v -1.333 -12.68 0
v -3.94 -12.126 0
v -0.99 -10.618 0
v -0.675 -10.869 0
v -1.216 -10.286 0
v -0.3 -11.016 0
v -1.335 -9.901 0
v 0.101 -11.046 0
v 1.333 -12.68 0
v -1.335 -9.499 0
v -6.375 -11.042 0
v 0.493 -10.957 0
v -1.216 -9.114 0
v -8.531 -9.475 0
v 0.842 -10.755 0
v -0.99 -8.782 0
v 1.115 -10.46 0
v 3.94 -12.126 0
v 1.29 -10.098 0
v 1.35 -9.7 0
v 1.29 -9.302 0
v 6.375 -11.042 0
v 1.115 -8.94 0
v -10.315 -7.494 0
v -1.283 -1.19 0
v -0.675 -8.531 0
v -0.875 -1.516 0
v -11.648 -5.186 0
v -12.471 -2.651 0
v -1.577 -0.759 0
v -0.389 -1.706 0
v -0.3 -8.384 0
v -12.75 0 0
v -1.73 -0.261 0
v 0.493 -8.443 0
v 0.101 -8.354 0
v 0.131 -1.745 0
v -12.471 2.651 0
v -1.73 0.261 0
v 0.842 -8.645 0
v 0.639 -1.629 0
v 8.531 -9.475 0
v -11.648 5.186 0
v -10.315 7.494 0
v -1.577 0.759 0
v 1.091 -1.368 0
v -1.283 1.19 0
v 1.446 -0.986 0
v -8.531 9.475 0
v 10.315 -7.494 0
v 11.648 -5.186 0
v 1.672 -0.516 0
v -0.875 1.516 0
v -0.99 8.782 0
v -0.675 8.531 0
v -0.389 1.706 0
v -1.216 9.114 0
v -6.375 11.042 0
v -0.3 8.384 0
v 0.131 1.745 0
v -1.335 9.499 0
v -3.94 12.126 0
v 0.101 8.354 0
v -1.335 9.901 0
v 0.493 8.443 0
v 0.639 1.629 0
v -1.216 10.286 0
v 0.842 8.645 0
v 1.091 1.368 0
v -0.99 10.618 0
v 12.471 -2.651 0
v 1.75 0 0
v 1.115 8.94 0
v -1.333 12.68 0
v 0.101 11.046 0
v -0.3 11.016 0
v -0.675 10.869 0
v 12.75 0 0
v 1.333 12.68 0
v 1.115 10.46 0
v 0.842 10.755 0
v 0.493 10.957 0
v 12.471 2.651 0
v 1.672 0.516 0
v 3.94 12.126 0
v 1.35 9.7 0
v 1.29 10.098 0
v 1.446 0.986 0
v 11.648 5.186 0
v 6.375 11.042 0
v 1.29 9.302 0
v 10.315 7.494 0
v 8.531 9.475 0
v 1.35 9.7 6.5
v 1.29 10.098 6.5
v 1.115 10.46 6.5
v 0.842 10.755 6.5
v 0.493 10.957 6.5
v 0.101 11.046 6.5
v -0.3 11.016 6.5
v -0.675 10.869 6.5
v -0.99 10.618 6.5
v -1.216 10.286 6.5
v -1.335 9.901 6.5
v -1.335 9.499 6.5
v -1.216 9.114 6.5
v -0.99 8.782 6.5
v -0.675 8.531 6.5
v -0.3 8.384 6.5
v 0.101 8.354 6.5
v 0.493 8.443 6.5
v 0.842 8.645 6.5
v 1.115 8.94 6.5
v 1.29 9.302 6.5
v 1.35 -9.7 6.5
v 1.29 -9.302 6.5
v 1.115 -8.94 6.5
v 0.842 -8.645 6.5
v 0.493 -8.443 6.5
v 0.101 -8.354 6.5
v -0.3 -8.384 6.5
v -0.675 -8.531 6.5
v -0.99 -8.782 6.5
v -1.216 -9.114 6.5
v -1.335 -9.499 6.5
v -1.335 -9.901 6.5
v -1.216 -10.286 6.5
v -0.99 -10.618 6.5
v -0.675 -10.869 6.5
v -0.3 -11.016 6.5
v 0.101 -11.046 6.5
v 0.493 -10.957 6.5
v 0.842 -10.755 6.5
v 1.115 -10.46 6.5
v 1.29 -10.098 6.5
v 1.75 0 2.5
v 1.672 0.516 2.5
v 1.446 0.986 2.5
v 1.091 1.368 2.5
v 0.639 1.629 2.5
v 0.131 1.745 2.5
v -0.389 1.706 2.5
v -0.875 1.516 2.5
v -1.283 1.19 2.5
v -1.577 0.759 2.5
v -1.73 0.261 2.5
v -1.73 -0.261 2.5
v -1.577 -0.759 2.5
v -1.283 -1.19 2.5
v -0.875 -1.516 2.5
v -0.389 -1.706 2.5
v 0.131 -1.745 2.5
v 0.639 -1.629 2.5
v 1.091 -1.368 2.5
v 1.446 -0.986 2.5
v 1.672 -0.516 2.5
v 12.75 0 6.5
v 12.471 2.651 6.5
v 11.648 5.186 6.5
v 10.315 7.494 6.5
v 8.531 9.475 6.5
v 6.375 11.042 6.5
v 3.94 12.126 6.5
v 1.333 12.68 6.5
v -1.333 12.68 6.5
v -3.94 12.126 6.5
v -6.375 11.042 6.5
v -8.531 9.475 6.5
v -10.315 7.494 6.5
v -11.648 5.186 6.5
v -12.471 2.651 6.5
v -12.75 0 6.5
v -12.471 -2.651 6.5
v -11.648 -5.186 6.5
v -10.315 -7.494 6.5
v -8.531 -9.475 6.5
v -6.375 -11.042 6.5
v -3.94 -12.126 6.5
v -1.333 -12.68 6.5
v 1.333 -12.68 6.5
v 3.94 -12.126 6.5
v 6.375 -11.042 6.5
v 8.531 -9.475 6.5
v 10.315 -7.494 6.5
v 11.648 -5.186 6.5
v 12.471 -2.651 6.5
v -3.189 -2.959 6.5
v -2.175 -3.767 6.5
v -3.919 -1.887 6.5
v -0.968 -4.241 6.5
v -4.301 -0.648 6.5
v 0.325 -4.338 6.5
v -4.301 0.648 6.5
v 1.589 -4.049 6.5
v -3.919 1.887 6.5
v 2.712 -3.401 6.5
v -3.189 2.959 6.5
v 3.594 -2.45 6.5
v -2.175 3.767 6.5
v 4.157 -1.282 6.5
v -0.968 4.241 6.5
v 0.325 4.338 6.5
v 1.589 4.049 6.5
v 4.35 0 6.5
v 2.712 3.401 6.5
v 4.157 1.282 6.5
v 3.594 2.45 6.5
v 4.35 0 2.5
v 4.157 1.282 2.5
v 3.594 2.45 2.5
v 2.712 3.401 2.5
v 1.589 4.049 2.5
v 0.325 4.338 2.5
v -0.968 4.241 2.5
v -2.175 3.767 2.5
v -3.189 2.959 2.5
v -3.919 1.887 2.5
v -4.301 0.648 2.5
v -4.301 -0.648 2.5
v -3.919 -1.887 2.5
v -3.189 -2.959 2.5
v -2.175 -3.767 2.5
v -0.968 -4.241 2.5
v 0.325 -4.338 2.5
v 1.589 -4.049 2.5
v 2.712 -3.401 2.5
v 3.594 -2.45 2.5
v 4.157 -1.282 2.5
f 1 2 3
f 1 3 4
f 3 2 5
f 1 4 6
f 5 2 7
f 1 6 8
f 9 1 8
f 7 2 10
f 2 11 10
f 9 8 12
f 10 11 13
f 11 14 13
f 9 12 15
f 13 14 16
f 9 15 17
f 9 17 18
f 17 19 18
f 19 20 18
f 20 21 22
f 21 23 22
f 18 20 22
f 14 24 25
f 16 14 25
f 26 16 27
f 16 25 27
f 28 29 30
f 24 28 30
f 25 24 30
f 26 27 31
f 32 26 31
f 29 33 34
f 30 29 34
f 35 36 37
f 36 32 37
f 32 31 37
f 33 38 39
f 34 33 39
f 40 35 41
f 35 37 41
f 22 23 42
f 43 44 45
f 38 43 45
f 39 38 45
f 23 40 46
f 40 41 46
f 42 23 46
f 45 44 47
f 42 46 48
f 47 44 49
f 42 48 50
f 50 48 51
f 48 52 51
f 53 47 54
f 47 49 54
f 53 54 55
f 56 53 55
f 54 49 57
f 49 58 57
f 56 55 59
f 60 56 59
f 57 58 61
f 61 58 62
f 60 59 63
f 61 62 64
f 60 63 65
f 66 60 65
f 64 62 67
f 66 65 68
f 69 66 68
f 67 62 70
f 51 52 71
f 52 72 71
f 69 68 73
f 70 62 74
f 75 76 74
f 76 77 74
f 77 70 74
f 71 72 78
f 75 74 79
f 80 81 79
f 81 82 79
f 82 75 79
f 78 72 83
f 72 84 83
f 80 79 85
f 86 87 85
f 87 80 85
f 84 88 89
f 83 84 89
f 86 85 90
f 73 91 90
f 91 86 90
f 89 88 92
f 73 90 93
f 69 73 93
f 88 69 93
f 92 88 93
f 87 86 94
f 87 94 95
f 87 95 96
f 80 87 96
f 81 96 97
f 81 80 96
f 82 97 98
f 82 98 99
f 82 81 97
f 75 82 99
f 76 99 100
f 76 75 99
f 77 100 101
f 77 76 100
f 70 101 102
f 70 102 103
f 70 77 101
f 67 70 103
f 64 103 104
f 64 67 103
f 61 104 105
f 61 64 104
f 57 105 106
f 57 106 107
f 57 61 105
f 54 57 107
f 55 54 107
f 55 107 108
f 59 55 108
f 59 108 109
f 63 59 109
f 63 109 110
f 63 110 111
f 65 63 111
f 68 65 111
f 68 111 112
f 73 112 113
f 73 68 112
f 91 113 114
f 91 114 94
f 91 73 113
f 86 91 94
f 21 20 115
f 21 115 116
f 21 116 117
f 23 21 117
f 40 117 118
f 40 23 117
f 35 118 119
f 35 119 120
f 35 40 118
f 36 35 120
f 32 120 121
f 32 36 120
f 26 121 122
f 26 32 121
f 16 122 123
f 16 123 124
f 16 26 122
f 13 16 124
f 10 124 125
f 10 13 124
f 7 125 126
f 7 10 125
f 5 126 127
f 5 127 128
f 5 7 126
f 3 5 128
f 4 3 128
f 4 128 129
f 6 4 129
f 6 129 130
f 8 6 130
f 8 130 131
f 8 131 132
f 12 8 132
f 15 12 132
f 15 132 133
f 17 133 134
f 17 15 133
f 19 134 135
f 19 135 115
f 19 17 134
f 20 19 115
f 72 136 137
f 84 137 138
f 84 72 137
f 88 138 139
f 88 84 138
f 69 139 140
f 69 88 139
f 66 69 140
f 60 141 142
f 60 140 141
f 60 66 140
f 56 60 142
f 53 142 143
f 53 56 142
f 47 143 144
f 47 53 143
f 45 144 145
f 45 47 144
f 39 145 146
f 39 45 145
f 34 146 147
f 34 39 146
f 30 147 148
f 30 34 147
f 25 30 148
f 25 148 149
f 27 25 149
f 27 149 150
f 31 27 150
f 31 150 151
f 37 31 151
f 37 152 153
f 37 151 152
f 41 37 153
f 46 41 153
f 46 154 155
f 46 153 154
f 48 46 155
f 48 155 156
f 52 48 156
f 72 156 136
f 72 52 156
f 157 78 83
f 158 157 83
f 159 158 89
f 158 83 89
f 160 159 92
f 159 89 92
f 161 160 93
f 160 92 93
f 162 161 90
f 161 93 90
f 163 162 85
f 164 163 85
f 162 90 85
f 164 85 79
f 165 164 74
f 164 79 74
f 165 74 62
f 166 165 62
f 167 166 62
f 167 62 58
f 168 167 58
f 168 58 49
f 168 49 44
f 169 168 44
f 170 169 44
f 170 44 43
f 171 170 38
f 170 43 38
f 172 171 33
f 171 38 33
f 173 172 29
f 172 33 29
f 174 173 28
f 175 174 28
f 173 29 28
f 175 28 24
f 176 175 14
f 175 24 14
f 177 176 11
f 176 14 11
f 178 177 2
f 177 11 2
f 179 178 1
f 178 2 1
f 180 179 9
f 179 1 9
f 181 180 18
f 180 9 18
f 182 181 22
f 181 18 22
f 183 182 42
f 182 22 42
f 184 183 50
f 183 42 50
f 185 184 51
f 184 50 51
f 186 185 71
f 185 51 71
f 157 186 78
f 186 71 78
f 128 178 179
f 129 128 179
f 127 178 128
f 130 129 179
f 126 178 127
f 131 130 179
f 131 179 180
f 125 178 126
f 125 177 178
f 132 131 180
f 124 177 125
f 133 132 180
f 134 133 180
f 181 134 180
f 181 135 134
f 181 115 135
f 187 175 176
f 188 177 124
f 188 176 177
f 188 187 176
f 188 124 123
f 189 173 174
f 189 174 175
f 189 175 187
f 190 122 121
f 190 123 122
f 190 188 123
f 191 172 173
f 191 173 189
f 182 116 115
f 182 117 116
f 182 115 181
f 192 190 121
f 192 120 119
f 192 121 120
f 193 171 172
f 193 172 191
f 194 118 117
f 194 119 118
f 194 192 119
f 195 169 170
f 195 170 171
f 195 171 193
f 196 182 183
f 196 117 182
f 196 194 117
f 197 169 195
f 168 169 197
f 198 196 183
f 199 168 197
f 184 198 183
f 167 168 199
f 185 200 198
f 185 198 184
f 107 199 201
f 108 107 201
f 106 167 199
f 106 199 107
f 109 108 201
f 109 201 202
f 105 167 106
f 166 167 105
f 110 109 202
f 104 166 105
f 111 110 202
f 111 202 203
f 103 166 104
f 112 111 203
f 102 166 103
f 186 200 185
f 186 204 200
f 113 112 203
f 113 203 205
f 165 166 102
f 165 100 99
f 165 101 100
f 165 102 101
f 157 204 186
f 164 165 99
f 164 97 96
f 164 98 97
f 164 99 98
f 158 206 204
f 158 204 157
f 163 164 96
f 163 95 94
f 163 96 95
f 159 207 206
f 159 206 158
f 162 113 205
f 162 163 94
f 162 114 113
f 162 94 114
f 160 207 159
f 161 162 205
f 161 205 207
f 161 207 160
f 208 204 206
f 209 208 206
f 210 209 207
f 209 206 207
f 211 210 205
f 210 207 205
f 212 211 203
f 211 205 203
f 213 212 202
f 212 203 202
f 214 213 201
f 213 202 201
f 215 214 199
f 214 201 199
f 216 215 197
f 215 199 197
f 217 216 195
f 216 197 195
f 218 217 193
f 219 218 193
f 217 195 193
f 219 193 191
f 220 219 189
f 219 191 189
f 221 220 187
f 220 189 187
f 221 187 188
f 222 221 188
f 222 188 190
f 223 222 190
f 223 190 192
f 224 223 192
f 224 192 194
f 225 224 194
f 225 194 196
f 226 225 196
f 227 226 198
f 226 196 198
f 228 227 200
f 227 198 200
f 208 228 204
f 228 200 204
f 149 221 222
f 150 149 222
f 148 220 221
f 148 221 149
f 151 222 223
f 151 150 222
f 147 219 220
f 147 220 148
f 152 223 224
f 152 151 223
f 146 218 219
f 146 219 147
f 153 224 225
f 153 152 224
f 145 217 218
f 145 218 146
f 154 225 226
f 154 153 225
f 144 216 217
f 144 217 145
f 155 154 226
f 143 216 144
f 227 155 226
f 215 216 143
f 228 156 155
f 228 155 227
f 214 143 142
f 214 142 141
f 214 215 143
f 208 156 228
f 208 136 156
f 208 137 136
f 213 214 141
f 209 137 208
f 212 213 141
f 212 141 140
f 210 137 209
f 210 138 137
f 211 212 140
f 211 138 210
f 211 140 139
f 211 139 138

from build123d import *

# Parameters (mm, degrees)
F0_R     = 12.75
F0_R_2   = 1.35
F0_R_3   = 1.75
F1_DEPTH = 6.5
F2_R     = 4.35
F3_DEPTH = 4


with BuildPart() as f1:
    # F0 (on Top) → F1 (new body)
    with BuildSketch(Plane.XY):
        Circle(F0_R)
        with Locations((0, -9.7)):
            Circle(F0_R_2, mode=Mode.SUBTRACT)
        Circle(F0_R_3, mode=Mode.SUBTRACT)
        with Locations((0, 9.7)):
            Circle(F0_R_2, mode=Mode.SUBTRACT)
    extrude(amount=F1_DEPTH)

    # F2 (on face) → F3 (cut)
    with BuildSketch(Plane.XY.offset(6.5)):
        Circle(F2_R)
    extrude(amount=-F3_DEPTH, mode=Mode.SUBTRACT)


solid = f1.part
